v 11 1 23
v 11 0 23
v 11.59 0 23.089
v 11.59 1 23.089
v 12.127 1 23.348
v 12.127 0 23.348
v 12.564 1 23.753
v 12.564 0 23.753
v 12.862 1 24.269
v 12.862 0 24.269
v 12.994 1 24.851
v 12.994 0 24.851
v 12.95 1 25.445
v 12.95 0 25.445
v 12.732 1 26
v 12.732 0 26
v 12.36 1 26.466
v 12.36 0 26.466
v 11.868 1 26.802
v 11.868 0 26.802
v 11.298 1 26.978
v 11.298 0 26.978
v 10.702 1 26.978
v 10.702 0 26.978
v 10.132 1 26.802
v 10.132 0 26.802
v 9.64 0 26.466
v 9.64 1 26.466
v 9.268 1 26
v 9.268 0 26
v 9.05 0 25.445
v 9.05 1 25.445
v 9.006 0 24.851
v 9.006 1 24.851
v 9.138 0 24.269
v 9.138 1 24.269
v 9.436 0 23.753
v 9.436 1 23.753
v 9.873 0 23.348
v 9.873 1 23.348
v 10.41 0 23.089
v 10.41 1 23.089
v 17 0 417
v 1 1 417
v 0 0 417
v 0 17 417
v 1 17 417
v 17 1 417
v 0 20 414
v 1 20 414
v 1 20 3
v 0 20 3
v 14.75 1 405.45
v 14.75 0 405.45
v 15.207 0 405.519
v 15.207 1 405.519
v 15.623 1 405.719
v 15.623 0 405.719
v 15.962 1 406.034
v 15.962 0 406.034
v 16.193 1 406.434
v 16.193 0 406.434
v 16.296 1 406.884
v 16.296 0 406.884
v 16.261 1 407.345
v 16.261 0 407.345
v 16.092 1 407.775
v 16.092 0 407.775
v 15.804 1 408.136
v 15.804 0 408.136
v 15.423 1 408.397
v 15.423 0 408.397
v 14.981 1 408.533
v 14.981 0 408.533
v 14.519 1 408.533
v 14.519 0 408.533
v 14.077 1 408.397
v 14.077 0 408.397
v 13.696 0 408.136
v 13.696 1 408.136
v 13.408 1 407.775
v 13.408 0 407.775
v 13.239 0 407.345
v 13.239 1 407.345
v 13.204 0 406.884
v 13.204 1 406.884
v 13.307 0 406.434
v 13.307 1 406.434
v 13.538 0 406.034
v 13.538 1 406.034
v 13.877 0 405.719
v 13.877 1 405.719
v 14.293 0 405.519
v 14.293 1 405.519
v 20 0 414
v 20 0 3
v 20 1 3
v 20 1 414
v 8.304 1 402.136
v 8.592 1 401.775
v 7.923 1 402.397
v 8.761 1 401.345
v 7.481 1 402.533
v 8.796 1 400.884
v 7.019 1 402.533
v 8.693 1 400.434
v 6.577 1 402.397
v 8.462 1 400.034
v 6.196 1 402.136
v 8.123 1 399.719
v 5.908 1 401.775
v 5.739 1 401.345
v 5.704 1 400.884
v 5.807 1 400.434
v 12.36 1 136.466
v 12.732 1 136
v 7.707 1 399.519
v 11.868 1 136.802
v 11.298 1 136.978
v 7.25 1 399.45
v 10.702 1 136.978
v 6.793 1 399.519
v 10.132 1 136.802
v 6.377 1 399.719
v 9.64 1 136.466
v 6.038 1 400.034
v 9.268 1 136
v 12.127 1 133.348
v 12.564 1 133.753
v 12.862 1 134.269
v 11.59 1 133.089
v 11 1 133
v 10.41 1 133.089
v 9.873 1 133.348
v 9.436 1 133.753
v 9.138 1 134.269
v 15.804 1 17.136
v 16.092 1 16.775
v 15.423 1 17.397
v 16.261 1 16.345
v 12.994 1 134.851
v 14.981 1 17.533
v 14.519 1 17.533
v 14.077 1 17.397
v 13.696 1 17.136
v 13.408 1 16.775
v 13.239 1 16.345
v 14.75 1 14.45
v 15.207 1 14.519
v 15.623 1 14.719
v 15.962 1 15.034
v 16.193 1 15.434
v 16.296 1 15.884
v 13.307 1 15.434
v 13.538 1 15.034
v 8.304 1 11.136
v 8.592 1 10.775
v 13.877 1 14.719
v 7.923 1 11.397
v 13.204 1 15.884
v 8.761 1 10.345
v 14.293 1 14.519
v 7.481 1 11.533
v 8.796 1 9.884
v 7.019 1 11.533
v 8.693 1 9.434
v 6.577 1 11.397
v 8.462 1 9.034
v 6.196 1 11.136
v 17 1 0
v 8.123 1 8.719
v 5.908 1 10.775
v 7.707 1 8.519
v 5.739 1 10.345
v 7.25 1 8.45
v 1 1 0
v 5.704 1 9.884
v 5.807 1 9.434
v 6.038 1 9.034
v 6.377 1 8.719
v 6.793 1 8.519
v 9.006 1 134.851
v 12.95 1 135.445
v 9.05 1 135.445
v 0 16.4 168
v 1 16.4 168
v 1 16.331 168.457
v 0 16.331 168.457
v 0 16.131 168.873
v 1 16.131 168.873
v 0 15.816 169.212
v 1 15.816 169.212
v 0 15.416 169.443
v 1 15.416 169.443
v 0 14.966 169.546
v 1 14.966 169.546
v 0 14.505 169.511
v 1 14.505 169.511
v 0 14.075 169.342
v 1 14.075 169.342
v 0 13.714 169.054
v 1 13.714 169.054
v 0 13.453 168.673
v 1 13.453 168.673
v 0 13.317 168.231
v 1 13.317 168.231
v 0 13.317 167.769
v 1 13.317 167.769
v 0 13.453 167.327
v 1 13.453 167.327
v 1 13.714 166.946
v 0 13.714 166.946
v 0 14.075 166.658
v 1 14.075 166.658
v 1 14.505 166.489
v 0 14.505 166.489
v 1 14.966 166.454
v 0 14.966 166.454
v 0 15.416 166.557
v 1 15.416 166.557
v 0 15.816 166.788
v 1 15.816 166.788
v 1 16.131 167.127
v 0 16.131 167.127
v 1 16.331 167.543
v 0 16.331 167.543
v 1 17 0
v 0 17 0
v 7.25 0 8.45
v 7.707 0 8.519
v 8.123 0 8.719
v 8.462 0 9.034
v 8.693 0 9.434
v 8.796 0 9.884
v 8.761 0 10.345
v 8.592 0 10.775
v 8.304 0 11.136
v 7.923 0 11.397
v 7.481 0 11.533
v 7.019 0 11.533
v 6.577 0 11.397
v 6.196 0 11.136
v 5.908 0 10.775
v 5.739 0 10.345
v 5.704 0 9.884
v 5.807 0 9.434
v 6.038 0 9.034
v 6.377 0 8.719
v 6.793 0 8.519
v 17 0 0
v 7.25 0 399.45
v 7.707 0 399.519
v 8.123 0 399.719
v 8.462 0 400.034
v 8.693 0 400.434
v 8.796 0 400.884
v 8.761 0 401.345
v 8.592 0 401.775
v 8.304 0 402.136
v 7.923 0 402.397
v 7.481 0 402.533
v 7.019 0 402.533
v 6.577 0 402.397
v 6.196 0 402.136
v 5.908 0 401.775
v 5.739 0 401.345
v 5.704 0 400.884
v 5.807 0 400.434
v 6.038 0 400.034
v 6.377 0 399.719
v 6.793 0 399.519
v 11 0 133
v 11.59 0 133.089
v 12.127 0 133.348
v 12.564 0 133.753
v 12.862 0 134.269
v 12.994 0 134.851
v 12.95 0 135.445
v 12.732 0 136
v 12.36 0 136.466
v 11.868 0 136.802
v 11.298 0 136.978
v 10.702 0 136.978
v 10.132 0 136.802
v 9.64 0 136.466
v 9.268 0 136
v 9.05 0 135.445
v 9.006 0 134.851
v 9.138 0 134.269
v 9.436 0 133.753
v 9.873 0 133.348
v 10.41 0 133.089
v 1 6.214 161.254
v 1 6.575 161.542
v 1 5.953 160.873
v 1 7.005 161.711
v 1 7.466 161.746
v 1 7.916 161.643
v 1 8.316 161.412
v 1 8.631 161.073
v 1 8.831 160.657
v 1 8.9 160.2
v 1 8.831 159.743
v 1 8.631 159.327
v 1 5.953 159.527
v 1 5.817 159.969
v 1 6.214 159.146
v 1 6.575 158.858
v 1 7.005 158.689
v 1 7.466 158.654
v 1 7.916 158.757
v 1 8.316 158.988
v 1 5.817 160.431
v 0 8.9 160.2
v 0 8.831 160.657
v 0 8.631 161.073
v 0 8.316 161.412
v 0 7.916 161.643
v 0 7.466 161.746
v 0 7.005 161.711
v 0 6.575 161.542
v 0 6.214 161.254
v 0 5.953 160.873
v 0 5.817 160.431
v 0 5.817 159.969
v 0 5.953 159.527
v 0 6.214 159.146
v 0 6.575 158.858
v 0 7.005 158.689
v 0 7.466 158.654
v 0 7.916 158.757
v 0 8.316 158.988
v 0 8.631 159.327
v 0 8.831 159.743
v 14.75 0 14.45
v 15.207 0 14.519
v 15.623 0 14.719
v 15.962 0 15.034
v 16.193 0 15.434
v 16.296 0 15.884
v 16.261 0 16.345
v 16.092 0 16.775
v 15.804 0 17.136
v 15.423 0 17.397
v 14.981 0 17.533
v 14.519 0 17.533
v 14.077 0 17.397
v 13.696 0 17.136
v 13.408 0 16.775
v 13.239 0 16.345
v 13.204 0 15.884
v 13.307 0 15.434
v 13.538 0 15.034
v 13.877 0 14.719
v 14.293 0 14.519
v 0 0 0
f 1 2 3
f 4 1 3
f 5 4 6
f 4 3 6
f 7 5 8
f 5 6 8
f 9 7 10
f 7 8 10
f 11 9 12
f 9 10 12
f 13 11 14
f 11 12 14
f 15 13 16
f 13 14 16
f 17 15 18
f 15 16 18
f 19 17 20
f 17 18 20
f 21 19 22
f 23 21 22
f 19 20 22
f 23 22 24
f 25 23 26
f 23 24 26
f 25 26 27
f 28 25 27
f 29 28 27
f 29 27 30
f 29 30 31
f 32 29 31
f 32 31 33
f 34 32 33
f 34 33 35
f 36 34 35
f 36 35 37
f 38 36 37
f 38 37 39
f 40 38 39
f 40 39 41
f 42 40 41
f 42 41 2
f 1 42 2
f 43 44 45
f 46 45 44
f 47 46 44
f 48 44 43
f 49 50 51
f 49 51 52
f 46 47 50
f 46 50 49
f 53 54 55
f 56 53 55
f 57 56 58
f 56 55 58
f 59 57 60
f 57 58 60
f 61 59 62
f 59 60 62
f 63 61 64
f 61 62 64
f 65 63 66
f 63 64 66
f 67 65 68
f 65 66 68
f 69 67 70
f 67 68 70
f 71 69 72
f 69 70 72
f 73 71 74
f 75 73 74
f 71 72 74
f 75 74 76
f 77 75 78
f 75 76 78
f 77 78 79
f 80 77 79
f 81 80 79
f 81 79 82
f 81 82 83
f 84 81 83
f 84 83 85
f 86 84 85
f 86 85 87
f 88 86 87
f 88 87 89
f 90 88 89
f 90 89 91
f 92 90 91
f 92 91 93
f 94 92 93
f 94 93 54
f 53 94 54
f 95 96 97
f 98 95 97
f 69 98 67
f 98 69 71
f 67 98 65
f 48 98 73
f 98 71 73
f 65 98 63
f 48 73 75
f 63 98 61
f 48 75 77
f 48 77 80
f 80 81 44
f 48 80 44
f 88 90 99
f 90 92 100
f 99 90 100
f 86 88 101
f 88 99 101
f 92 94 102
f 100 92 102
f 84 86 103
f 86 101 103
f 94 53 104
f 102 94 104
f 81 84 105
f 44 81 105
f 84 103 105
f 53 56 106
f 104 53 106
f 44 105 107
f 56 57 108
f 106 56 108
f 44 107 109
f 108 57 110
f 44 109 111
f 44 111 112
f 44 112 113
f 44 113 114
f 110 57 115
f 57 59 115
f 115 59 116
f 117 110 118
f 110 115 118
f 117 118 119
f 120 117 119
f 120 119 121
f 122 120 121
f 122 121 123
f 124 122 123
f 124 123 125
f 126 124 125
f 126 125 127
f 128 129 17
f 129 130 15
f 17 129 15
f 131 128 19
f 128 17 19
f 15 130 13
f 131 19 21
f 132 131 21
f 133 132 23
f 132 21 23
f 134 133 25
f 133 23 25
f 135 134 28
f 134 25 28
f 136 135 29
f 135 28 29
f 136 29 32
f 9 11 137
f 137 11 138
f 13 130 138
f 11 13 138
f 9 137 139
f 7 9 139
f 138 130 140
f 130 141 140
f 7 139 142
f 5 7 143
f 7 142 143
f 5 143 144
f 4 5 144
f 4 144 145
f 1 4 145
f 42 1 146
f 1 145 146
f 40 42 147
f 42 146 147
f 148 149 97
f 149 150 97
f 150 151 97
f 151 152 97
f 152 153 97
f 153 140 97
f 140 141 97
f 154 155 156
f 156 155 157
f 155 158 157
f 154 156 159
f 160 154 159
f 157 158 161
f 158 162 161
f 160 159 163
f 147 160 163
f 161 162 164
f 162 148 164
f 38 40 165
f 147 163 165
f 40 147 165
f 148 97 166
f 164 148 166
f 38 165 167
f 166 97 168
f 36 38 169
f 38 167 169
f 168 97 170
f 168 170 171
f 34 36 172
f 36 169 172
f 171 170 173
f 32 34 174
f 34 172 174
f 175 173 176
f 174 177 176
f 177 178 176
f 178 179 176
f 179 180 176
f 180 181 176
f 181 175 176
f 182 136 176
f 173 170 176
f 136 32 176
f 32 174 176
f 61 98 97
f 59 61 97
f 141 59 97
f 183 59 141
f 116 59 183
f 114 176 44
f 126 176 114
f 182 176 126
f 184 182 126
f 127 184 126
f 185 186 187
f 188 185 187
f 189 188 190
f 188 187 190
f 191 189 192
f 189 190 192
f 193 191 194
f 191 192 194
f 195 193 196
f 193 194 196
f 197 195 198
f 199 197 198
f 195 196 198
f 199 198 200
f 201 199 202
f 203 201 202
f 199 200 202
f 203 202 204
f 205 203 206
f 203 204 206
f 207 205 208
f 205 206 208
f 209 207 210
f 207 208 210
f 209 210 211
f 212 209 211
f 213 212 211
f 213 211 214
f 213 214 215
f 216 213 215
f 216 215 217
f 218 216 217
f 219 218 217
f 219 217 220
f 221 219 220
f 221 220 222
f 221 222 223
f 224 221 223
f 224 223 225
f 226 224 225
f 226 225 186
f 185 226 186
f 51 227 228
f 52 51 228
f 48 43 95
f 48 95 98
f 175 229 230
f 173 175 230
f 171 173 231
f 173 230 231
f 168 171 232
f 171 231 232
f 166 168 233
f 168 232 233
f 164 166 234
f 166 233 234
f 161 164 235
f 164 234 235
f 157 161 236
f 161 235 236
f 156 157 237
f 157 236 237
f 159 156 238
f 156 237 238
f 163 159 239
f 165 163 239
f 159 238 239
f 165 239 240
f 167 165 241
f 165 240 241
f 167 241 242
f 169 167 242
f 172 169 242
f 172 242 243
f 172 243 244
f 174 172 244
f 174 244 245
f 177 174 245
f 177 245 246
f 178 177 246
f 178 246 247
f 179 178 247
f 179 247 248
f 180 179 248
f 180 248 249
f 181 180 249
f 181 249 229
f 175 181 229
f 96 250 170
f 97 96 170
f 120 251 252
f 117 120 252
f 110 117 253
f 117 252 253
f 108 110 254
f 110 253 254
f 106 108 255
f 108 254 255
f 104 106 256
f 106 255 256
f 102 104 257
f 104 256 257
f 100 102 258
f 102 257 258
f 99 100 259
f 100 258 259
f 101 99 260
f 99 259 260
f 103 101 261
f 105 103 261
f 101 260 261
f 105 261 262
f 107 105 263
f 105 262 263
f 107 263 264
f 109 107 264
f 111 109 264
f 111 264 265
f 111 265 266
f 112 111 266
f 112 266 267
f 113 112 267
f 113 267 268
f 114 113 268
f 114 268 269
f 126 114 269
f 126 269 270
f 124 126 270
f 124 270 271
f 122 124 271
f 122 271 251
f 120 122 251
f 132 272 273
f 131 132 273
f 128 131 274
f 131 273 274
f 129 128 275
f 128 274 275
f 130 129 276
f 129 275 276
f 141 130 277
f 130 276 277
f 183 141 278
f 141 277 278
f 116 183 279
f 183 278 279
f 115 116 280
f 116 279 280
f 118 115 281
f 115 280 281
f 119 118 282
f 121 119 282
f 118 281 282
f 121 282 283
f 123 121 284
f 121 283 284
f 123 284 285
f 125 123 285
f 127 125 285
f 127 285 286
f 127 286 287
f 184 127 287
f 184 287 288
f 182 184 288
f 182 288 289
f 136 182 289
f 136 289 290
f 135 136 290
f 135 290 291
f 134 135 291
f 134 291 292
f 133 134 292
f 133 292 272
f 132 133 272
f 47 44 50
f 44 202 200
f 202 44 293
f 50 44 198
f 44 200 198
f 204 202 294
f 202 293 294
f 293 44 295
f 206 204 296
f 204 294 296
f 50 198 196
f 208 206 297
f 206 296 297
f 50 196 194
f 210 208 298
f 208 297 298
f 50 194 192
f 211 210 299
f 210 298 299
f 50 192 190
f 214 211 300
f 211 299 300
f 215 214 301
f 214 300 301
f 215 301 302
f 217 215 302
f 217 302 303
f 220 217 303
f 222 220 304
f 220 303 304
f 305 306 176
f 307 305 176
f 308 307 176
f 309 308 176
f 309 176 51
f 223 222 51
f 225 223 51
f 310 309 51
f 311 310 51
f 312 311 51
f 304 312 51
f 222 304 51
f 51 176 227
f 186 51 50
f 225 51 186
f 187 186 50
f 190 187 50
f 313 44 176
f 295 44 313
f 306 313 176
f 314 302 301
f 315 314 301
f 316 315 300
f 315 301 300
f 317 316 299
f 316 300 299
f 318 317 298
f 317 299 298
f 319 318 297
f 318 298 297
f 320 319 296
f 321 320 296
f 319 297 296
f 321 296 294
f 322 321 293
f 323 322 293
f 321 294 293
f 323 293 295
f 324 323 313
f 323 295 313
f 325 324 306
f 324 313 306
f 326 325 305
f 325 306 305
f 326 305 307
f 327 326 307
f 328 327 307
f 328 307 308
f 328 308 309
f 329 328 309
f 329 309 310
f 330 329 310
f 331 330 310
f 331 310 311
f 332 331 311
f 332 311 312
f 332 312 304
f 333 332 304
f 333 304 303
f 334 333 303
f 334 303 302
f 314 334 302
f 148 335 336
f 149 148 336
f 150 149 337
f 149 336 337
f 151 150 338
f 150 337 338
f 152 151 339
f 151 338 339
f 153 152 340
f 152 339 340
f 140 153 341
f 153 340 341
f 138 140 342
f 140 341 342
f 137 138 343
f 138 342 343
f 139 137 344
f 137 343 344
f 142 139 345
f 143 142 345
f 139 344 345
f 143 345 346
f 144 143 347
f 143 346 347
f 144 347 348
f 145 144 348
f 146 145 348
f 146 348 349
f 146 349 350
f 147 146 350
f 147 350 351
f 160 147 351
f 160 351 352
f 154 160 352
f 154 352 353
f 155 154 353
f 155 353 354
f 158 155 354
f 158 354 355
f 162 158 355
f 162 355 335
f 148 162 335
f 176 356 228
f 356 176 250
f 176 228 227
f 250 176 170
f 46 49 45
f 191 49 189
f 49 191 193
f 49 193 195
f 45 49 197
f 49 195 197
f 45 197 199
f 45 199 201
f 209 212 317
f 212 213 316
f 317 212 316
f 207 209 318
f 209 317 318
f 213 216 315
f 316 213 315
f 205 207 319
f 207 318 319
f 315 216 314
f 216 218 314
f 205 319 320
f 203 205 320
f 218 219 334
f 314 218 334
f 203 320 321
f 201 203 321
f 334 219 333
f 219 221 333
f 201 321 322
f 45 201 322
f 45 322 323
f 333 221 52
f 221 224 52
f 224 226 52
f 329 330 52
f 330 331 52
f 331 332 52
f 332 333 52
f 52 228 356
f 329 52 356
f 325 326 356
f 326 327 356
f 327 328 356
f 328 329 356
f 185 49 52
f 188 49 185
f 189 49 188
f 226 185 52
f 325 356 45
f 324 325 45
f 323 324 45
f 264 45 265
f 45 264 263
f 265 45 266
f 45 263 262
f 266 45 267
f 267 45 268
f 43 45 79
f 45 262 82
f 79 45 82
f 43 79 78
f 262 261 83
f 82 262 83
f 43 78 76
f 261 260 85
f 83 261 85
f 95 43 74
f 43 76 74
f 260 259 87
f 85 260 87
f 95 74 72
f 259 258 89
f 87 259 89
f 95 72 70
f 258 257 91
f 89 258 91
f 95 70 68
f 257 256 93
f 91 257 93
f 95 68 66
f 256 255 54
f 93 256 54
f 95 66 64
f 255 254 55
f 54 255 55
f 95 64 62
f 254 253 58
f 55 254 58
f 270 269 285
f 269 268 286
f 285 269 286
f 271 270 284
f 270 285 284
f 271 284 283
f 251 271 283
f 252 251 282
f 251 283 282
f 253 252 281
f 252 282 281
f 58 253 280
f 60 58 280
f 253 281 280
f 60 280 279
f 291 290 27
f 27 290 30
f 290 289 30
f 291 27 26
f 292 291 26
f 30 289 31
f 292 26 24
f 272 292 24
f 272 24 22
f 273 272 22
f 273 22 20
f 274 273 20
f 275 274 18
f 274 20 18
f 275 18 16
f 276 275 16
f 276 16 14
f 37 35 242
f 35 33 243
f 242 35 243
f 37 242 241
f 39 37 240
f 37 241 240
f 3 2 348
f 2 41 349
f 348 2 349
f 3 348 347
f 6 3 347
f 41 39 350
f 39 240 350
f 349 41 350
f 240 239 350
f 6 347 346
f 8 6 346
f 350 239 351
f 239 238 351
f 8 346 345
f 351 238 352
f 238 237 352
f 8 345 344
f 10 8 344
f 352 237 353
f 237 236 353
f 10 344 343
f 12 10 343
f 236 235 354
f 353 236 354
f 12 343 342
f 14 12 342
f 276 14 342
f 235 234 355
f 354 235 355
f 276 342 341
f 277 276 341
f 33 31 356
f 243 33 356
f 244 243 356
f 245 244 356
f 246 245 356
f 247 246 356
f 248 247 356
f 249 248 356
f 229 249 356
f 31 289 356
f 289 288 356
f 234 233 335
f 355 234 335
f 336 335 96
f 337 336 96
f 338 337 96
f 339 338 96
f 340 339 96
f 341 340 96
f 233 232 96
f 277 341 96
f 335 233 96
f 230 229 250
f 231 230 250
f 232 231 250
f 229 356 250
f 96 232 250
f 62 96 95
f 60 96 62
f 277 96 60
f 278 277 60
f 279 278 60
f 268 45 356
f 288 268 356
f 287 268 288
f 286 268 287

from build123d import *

# Parameters (mm, degrees)
BASE_DEPTH          = 417
CHAMFER1_SIZE       = 3
SKETCH3_R           = 1.55
FORCABLECHAIN_DEPTH = 10
SKETCH4_R           = 1.55
GUIDEHOLES_DEPTH    = 418.958131874
SKETCH5_R           = 2
CABLETIEHOLES_DEPTH = 418.958131874


with BuildPart() as part:
    # Sketch1 → Base (new body)
    with BuildSketch(Plane.XY):
        Polygon((0, 0), (20, 0), (20, 1), (1, 1), (1, 20), (0, 20), align=None)
    extrude(amount=BASE_DEPTH)

    # Chamfer1
    chamfer1_edges = [part.edges().sort_by_distance(p)[0] for p in [
        (20, 0.5, 417),
        (0.5, 20, 417),
        (0.5, 20, 0),
        (20, 0.5, 0),
    ]]
    chamfer(chamfer1_edges, length=CHAMFER1_SIZE)

    # Sketch3 → ForCableChain (cut)
    with BuildSketch(Plane(origin=(1, 0, 0), x_dir=(0, 0, -1), z_dir=(1, 0, 0))):
        with Locations(Location((-168, 14.85, 0), (0, 0, 90))):
            Circle(SKETCH3_R)
        with Locations(Location((-160.2, 7.35, 0), (0, 0, 90))):
            Circle(SKETCH3_R)
    extrude(amount=-FORCABLECHAIN_DEPTH, mode=Mode.SUBTRACT)

    # Sketch4 → GuideHoles (cut, through all)
    with BuildSketch(Plane.XZ):
        with Locations(Location((7.25, 10, 0), (0, 0, 270))):
            Circle(SKETCH4_R)
        with Locations(Location((14.75, 16, 0), (0, 0, 270))):
            Circle(SKETCH4_R)
        with Locations(Location((7.25, 401, 0), (0, 0, 270))):
            Circle(SKETCH4_R)
        with Locations(Location((14.75, 407, 0), (0, 0, 270))):
            Circle(SKETCH4_R)
    extrude(amount=-GUIDEHOLES_DEPTH, mode=Mode.SUBTRACT)

    # Sketch5 → CableTieHoles (cut, through all)
    with BuildSketch(Plane.XZ):
        with Locations(Location((11, 25, 0), (0, 0, 270))):
            Circle(SKETCH5_R)
        with Locations(Location((11, 135, 0), (0, 0, 270))):
            Circle(SKETCH5_R)
    extrude(amount=-CABLETIEHOLES_DEPTH, mode=Mode.SUBTRACT)


solid = part.part
